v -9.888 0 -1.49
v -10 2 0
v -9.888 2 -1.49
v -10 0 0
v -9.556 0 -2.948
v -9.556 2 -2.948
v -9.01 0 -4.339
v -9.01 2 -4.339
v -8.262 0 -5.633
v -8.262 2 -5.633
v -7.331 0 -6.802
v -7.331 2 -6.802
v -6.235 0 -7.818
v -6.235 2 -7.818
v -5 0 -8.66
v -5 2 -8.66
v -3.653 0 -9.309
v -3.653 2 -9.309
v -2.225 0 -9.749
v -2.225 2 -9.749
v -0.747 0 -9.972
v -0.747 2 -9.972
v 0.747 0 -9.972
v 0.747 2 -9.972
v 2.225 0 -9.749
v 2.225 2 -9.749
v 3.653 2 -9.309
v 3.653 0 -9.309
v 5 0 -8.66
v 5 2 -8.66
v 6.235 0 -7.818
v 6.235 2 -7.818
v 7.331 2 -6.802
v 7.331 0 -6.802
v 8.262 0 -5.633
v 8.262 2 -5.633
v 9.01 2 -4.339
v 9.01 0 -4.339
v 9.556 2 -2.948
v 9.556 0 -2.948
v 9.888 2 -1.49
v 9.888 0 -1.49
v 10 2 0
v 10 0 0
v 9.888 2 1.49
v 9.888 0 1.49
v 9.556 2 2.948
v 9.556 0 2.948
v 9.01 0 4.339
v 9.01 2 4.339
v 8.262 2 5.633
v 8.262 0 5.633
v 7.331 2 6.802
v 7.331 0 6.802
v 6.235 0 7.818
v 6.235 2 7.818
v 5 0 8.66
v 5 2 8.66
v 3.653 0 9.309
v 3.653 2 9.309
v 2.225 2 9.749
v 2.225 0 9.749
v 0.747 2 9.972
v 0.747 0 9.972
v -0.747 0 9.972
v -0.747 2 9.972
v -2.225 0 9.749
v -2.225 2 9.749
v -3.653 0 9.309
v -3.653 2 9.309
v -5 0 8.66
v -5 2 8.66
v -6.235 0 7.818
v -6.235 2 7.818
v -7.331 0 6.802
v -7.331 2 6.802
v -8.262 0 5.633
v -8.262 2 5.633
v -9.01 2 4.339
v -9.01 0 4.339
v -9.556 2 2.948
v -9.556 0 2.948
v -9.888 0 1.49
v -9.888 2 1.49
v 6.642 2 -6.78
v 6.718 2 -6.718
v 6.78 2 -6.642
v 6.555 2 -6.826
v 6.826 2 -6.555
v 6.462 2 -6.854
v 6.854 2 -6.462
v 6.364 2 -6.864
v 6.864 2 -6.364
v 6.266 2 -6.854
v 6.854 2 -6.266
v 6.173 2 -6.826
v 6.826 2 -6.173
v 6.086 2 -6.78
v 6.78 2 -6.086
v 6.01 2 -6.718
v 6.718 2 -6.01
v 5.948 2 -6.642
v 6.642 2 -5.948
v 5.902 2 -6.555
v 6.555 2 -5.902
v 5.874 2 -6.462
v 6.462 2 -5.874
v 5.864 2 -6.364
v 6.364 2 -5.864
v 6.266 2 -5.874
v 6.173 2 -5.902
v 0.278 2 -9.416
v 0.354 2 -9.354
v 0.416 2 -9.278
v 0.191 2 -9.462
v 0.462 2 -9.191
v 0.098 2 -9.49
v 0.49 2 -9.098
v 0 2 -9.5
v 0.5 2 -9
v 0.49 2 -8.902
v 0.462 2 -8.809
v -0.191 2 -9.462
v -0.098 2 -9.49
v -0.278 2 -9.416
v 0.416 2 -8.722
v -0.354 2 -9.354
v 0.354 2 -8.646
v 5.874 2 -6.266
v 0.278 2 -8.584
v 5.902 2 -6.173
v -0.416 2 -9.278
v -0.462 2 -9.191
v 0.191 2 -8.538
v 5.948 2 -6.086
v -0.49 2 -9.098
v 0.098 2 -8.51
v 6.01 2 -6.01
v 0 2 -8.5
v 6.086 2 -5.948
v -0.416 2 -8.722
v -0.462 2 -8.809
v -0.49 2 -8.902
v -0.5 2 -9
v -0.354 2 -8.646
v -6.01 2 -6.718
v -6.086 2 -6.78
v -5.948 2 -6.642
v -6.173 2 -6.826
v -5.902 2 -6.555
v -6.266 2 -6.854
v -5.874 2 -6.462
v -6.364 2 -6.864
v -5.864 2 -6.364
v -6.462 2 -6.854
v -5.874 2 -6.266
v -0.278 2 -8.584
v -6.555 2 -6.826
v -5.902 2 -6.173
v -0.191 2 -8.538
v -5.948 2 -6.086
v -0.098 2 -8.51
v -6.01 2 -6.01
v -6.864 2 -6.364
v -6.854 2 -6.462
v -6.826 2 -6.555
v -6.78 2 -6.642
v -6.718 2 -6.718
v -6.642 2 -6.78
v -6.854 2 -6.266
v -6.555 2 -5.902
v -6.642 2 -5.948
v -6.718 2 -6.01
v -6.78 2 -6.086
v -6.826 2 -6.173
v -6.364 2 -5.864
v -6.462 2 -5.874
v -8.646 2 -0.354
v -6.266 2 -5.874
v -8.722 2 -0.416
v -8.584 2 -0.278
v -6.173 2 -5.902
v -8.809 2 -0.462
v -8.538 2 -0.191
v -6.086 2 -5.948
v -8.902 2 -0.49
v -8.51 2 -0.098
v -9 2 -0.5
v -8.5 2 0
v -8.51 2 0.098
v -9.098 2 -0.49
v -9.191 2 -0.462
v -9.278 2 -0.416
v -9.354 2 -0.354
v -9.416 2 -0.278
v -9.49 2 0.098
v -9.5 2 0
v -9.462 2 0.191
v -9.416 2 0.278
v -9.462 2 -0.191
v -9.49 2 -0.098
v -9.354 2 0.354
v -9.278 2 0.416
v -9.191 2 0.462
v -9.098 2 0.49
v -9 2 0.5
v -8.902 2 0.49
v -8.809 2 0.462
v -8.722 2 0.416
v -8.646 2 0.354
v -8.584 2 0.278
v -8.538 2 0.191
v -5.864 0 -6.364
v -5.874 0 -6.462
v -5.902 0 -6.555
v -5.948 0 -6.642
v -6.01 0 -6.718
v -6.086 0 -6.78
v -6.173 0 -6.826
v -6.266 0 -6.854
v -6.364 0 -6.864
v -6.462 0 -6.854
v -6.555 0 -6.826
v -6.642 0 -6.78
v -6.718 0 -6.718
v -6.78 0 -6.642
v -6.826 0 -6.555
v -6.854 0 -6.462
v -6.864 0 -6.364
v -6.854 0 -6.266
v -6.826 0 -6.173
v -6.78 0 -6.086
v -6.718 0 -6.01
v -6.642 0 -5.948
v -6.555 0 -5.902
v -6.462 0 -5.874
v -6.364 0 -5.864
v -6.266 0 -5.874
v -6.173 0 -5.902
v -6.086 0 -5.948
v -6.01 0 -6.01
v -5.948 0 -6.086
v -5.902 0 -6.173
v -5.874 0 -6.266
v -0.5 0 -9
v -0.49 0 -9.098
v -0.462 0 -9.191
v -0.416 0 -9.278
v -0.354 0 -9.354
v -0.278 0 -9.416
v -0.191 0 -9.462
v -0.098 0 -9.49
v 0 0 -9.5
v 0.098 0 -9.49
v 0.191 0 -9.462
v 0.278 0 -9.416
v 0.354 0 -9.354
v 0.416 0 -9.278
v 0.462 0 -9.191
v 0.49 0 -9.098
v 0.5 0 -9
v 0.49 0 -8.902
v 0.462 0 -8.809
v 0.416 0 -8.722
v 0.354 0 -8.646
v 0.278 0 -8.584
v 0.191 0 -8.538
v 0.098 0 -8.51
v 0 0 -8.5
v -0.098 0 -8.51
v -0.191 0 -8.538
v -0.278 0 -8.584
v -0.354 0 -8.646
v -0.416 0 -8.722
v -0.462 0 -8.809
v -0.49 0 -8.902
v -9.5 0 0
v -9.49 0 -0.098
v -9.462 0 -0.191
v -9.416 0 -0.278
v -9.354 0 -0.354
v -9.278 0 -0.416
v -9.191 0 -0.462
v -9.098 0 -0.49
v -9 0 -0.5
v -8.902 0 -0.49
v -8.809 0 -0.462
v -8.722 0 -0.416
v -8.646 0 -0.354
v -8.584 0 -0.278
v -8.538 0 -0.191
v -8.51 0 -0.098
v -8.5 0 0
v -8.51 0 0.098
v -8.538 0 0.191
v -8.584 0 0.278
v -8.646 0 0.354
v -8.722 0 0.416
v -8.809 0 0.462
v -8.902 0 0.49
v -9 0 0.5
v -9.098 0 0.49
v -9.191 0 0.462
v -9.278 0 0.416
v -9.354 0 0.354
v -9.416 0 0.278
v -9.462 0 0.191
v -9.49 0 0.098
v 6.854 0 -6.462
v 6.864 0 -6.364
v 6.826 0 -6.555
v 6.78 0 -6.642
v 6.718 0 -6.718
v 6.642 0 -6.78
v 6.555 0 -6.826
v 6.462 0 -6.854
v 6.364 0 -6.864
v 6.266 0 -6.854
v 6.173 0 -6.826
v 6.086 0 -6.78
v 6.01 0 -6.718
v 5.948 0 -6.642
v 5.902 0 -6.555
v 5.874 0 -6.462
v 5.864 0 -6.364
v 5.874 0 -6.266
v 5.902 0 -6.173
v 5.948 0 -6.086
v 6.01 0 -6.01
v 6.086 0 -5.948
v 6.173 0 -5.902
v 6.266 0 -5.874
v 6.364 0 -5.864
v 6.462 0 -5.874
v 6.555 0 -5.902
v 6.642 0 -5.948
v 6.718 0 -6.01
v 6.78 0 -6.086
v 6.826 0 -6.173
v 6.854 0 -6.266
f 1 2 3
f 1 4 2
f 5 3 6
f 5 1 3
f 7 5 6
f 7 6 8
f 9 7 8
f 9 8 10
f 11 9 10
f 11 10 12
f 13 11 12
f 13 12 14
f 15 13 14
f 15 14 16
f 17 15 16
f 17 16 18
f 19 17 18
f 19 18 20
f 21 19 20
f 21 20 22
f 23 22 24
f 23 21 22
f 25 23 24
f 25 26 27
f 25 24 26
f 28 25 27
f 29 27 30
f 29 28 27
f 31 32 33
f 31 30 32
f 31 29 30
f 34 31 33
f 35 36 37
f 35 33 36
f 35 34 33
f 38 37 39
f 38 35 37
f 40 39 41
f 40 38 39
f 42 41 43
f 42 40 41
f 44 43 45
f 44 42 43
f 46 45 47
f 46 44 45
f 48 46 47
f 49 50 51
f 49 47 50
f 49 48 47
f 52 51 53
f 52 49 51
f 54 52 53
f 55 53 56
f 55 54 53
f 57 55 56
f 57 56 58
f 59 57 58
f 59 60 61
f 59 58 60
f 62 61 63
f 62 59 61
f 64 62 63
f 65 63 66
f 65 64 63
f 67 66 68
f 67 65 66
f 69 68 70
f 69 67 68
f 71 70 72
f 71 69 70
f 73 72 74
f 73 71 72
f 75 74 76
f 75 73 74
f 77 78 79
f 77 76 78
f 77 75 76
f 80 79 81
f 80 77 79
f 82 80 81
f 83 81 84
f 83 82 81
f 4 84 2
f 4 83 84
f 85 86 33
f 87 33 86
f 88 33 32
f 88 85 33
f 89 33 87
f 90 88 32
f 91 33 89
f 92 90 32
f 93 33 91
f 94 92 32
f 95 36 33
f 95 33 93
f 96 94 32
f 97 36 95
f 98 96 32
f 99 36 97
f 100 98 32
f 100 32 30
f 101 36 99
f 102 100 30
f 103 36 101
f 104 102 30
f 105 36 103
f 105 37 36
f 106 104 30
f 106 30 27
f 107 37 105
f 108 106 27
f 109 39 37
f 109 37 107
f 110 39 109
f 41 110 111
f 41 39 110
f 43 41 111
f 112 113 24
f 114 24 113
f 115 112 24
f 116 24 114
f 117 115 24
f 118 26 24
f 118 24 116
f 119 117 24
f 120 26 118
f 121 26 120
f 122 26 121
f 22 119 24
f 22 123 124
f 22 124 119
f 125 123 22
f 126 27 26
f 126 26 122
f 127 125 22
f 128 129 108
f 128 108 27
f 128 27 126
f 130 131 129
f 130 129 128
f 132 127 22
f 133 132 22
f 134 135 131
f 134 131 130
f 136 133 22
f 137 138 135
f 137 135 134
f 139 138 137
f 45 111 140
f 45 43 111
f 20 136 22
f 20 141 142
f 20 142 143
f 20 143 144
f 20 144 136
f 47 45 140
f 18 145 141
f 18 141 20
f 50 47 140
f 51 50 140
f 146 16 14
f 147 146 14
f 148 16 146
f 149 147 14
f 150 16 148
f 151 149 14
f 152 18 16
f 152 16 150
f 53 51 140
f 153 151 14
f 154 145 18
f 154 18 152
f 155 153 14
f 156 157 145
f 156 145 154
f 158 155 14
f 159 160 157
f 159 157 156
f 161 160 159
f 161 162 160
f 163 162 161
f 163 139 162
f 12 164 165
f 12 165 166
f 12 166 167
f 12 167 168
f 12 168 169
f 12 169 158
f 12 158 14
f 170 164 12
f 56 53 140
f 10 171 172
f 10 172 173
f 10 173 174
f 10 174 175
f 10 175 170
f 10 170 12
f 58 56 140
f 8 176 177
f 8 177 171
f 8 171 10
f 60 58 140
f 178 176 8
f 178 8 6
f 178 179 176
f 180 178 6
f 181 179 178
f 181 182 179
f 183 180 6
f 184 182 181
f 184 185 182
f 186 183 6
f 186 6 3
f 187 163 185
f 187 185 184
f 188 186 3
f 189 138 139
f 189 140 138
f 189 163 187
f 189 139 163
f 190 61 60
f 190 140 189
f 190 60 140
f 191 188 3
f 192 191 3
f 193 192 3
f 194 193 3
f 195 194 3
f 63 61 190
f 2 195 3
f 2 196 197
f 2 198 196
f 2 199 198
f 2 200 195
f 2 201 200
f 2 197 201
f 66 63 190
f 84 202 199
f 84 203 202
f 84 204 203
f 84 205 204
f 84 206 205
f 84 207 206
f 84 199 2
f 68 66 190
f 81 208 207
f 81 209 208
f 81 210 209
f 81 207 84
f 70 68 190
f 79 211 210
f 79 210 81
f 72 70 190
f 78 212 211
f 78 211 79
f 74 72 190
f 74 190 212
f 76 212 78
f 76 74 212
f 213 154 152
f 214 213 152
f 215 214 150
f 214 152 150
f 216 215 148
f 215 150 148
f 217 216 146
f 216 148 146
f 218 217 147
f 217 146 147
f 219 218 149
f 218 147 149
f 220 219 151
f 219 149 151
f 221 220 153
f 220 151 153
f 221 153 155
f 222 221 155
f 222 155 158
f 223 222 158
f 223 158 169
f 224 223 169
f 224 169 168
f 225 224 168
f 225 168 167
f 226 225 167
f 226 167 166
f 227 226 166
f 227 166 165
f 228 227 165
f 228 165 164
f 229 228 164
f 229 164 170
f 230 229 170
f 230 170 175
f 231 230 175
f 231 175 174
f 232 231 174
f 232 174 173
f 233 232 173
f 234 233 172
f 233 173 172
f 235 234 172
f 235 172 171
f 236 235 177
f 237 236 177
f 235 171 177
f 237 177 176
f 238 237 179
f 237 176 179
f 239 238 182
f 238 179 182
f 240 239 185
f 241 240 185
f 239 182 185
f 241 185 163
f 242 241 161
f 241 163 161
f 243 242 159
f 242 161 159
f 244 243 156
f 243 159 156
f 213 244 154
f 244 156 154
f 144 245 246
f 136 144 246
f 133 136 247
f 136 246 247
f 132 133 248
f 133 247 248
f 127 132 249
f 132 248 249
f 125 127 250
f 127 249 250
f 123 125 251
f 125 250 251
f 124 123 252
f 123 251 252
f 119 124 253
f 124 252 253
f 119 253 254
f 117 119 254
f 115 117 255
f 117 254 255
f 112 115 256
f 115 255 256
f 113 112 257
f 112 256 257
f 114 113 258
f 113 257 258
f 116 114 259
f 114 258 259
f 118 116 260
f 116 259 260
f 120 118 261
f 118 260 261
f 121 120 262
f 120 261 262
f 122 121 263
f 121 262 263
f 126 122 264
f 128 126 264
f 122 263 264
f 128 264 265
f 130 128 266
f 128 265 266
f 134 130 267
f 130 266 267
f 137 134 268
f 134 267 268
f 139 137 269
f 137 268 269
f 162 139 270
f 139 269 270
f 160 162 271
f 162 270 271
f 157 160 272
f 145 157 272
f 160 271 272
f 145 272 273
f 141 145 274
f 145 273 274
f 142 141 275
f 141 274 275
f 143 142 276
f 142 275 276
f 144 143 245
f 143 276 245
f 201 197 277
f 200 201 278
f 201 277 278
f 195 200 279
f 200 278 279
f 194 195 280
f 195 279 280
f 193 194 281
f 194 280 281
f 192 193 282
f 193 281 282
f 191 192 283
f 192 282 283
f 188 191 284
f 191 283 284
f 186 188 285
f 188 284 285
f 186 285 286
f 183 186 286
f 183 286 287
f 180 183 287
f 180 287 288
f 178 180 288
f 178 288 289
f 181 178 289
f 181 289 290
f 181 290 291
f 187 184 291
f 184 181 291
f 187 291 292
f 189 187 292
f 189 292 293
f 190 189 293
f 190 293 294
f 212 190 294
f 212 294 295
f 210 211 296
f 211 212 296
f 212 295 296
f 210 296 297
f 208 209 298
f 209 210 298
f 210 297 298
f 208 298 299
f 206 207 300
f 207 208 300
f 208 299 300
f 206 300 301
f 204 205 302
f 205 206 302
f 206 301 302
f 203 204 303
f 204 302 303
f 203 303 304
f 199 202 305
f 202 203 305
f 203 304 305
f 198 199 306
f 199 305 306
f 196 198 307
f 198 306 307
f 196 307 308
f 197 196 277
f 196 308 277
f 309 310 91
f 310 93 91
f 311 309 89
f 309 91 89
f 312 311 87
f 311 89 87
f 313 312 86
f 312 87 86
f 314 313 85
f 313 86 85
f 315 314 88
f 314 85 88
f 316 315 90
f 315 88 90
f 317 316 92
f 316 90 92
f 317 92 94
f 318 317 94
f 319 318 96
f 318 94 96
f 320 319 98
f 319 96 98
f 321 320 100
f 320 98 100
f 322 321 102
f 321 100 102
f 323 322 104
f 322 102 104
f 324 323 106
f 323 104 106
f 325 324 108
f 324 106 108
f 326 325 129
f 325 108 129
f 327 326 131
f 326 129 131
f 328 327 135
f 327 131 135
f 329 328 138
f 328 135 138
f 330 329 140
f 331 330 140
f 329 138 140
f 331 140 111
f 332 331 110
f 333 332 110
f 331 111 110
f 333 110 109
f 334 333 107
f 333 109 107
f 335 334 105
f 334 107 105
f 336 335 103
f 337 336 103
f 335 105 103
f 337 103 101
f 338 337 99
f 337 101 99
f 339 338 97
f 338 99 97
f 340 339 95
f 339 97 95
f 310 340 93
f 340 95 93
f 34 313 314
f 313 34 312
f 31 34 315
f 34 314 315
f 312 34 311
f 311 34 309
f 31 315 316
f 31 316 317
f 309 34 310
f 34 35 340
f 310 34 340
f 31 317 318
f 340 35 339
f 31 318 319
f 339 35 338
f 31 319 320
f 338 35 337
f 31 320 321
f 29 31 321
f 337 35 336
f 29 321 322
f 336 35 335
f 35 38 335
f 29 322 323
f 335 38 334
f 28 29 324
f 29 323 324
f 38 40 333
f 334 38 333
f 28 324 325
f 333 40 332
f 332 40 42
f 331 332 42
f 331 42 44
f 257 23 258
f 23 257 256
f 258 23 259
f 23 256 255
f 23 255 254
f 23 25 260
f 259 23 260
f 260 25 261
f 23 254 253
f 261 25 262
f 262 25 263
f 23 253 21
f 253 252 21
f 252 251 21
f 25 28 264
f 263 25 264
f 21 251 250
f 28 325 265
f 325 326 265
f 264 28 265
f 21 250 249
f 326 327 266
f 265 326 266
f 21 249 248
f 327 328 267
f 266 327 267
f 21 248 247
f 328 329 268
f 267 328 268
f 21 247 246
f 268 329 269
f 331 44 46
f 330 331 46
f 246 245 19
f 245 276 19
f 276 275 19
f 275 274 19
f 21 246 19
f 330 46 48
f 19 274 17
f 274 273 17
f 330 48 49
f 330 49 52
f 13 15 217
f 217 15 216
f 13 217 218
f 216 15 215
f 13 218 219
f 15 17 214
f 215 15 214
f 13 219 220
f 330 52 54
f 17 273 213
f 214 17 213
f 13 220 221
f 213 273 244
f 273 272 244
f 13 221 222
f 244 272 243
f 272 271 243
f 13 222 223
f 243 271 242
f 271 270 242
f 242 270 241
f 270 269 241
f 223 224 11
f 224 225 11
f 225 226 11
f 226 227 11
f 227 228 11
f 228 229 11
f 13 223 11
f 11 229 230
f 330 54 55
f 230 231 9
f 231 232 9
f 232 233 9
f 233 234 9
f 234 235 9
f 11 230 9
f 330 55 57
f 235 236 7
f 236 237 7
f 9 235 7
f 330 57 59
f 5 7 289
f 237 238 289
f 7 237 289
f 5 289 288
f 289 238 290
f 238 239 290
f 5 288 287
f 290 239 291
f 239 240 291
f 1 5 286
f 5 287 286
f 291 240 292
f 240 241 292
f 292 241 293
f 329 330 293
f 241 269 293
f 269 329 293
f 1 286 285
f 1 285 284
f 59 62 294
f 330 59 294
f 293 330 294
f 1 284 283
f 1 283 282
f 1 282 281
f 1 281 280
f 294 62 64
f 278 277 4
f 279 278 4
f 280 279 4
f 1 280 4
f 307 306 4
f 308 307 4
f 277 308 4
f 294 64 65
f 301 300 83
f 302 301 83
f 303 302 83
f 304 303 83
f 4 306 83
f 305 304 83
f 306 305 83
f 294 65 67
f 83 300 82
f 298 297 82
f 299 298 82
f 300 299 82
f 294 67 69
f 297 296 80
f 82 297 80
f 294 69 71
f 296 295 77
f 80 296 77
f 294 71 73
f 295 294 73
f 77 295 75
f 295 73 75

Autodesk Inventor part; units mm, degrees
ref_plane "YZ Plane" through (0, 0, 0) normal (1, 0, 0) x (0, 1, 0)
ref_plane "XZ Plane" through (0, 0, 0) normal (0, 1, 0) x (-1, 0, 0)
ref_plane "XY Plane" through (0, 0, 0) normal (0, 0, 1) x (1, 0, 0)
sketch "Sketch1" plane through (0, 0, 0) normal (0, 1, 0) x (-1, 0, 0)
  circle A0 centre (0, 0) radius 10
  line L0 (0, 0) -> (10, 0)
  line L1 (0, 0) -> (0, -10)
  line L2 (10, 0) -> (9, 0)
  line L3 (0, -10) -> (0, -9)
  circle A1 centre (9, 0) radius 0.5
  circle A2 centre (0, -9) radius 0.5
  dimension "d0" = 20
  dimension "d1" = 1
  dimension "d2" = 1
  dimension "d3" = 1
  dimension "d4" = 1
extrude "Extrusion1" add sketch "Sketch1" along normal blind 2 contours L0 A1 L1 A2 A0 | A0 L1 A2 L0 A1
sketch "Sketch2" plane through (0, 2, 0) normal (0, 1, 0) x (1, 0, 0)
  line L0 (0, 0) -> (-7.0711, 7.0711)
  circle A0 centre (0, 0) radius 10 projected
  line L1 (0, 0) -> (10, 0) construction
  line L2 (-7.0711, 7.0711) -> (-6.364, 6.364)
  circle A1 centre (-6.364, 6.364) radius 0.5
  dimension "d7" = 135
  dimension "d8" = 1
  dimension "d9" = 1
extrude "Extrusion2" cut sketch "Sketch2" against normal blind 10 contours A1 L0 | L0 A1
sketch "Sketch3" plane through (0, 2, 0) normal (0, 1, 0) x (1, 0, 0)
  line L0 (0, 0) -> (7.0711, 7.0711)
  line L1 (0, 0) -> (10, 0) construction
  line L2 (7.0711, 7.0711) -> (6.364, 6.364)
  circle A0 centre (6.364, 6.364) radius 0.5
  dimension "d12" = 10
  dimension "d13" = 45
  dimension "d14" = 1
  dimension "d15" = 1
extrude "Extrusion3" cut sketch "Sketch3" against normal blind 10
properties part number "drum"
